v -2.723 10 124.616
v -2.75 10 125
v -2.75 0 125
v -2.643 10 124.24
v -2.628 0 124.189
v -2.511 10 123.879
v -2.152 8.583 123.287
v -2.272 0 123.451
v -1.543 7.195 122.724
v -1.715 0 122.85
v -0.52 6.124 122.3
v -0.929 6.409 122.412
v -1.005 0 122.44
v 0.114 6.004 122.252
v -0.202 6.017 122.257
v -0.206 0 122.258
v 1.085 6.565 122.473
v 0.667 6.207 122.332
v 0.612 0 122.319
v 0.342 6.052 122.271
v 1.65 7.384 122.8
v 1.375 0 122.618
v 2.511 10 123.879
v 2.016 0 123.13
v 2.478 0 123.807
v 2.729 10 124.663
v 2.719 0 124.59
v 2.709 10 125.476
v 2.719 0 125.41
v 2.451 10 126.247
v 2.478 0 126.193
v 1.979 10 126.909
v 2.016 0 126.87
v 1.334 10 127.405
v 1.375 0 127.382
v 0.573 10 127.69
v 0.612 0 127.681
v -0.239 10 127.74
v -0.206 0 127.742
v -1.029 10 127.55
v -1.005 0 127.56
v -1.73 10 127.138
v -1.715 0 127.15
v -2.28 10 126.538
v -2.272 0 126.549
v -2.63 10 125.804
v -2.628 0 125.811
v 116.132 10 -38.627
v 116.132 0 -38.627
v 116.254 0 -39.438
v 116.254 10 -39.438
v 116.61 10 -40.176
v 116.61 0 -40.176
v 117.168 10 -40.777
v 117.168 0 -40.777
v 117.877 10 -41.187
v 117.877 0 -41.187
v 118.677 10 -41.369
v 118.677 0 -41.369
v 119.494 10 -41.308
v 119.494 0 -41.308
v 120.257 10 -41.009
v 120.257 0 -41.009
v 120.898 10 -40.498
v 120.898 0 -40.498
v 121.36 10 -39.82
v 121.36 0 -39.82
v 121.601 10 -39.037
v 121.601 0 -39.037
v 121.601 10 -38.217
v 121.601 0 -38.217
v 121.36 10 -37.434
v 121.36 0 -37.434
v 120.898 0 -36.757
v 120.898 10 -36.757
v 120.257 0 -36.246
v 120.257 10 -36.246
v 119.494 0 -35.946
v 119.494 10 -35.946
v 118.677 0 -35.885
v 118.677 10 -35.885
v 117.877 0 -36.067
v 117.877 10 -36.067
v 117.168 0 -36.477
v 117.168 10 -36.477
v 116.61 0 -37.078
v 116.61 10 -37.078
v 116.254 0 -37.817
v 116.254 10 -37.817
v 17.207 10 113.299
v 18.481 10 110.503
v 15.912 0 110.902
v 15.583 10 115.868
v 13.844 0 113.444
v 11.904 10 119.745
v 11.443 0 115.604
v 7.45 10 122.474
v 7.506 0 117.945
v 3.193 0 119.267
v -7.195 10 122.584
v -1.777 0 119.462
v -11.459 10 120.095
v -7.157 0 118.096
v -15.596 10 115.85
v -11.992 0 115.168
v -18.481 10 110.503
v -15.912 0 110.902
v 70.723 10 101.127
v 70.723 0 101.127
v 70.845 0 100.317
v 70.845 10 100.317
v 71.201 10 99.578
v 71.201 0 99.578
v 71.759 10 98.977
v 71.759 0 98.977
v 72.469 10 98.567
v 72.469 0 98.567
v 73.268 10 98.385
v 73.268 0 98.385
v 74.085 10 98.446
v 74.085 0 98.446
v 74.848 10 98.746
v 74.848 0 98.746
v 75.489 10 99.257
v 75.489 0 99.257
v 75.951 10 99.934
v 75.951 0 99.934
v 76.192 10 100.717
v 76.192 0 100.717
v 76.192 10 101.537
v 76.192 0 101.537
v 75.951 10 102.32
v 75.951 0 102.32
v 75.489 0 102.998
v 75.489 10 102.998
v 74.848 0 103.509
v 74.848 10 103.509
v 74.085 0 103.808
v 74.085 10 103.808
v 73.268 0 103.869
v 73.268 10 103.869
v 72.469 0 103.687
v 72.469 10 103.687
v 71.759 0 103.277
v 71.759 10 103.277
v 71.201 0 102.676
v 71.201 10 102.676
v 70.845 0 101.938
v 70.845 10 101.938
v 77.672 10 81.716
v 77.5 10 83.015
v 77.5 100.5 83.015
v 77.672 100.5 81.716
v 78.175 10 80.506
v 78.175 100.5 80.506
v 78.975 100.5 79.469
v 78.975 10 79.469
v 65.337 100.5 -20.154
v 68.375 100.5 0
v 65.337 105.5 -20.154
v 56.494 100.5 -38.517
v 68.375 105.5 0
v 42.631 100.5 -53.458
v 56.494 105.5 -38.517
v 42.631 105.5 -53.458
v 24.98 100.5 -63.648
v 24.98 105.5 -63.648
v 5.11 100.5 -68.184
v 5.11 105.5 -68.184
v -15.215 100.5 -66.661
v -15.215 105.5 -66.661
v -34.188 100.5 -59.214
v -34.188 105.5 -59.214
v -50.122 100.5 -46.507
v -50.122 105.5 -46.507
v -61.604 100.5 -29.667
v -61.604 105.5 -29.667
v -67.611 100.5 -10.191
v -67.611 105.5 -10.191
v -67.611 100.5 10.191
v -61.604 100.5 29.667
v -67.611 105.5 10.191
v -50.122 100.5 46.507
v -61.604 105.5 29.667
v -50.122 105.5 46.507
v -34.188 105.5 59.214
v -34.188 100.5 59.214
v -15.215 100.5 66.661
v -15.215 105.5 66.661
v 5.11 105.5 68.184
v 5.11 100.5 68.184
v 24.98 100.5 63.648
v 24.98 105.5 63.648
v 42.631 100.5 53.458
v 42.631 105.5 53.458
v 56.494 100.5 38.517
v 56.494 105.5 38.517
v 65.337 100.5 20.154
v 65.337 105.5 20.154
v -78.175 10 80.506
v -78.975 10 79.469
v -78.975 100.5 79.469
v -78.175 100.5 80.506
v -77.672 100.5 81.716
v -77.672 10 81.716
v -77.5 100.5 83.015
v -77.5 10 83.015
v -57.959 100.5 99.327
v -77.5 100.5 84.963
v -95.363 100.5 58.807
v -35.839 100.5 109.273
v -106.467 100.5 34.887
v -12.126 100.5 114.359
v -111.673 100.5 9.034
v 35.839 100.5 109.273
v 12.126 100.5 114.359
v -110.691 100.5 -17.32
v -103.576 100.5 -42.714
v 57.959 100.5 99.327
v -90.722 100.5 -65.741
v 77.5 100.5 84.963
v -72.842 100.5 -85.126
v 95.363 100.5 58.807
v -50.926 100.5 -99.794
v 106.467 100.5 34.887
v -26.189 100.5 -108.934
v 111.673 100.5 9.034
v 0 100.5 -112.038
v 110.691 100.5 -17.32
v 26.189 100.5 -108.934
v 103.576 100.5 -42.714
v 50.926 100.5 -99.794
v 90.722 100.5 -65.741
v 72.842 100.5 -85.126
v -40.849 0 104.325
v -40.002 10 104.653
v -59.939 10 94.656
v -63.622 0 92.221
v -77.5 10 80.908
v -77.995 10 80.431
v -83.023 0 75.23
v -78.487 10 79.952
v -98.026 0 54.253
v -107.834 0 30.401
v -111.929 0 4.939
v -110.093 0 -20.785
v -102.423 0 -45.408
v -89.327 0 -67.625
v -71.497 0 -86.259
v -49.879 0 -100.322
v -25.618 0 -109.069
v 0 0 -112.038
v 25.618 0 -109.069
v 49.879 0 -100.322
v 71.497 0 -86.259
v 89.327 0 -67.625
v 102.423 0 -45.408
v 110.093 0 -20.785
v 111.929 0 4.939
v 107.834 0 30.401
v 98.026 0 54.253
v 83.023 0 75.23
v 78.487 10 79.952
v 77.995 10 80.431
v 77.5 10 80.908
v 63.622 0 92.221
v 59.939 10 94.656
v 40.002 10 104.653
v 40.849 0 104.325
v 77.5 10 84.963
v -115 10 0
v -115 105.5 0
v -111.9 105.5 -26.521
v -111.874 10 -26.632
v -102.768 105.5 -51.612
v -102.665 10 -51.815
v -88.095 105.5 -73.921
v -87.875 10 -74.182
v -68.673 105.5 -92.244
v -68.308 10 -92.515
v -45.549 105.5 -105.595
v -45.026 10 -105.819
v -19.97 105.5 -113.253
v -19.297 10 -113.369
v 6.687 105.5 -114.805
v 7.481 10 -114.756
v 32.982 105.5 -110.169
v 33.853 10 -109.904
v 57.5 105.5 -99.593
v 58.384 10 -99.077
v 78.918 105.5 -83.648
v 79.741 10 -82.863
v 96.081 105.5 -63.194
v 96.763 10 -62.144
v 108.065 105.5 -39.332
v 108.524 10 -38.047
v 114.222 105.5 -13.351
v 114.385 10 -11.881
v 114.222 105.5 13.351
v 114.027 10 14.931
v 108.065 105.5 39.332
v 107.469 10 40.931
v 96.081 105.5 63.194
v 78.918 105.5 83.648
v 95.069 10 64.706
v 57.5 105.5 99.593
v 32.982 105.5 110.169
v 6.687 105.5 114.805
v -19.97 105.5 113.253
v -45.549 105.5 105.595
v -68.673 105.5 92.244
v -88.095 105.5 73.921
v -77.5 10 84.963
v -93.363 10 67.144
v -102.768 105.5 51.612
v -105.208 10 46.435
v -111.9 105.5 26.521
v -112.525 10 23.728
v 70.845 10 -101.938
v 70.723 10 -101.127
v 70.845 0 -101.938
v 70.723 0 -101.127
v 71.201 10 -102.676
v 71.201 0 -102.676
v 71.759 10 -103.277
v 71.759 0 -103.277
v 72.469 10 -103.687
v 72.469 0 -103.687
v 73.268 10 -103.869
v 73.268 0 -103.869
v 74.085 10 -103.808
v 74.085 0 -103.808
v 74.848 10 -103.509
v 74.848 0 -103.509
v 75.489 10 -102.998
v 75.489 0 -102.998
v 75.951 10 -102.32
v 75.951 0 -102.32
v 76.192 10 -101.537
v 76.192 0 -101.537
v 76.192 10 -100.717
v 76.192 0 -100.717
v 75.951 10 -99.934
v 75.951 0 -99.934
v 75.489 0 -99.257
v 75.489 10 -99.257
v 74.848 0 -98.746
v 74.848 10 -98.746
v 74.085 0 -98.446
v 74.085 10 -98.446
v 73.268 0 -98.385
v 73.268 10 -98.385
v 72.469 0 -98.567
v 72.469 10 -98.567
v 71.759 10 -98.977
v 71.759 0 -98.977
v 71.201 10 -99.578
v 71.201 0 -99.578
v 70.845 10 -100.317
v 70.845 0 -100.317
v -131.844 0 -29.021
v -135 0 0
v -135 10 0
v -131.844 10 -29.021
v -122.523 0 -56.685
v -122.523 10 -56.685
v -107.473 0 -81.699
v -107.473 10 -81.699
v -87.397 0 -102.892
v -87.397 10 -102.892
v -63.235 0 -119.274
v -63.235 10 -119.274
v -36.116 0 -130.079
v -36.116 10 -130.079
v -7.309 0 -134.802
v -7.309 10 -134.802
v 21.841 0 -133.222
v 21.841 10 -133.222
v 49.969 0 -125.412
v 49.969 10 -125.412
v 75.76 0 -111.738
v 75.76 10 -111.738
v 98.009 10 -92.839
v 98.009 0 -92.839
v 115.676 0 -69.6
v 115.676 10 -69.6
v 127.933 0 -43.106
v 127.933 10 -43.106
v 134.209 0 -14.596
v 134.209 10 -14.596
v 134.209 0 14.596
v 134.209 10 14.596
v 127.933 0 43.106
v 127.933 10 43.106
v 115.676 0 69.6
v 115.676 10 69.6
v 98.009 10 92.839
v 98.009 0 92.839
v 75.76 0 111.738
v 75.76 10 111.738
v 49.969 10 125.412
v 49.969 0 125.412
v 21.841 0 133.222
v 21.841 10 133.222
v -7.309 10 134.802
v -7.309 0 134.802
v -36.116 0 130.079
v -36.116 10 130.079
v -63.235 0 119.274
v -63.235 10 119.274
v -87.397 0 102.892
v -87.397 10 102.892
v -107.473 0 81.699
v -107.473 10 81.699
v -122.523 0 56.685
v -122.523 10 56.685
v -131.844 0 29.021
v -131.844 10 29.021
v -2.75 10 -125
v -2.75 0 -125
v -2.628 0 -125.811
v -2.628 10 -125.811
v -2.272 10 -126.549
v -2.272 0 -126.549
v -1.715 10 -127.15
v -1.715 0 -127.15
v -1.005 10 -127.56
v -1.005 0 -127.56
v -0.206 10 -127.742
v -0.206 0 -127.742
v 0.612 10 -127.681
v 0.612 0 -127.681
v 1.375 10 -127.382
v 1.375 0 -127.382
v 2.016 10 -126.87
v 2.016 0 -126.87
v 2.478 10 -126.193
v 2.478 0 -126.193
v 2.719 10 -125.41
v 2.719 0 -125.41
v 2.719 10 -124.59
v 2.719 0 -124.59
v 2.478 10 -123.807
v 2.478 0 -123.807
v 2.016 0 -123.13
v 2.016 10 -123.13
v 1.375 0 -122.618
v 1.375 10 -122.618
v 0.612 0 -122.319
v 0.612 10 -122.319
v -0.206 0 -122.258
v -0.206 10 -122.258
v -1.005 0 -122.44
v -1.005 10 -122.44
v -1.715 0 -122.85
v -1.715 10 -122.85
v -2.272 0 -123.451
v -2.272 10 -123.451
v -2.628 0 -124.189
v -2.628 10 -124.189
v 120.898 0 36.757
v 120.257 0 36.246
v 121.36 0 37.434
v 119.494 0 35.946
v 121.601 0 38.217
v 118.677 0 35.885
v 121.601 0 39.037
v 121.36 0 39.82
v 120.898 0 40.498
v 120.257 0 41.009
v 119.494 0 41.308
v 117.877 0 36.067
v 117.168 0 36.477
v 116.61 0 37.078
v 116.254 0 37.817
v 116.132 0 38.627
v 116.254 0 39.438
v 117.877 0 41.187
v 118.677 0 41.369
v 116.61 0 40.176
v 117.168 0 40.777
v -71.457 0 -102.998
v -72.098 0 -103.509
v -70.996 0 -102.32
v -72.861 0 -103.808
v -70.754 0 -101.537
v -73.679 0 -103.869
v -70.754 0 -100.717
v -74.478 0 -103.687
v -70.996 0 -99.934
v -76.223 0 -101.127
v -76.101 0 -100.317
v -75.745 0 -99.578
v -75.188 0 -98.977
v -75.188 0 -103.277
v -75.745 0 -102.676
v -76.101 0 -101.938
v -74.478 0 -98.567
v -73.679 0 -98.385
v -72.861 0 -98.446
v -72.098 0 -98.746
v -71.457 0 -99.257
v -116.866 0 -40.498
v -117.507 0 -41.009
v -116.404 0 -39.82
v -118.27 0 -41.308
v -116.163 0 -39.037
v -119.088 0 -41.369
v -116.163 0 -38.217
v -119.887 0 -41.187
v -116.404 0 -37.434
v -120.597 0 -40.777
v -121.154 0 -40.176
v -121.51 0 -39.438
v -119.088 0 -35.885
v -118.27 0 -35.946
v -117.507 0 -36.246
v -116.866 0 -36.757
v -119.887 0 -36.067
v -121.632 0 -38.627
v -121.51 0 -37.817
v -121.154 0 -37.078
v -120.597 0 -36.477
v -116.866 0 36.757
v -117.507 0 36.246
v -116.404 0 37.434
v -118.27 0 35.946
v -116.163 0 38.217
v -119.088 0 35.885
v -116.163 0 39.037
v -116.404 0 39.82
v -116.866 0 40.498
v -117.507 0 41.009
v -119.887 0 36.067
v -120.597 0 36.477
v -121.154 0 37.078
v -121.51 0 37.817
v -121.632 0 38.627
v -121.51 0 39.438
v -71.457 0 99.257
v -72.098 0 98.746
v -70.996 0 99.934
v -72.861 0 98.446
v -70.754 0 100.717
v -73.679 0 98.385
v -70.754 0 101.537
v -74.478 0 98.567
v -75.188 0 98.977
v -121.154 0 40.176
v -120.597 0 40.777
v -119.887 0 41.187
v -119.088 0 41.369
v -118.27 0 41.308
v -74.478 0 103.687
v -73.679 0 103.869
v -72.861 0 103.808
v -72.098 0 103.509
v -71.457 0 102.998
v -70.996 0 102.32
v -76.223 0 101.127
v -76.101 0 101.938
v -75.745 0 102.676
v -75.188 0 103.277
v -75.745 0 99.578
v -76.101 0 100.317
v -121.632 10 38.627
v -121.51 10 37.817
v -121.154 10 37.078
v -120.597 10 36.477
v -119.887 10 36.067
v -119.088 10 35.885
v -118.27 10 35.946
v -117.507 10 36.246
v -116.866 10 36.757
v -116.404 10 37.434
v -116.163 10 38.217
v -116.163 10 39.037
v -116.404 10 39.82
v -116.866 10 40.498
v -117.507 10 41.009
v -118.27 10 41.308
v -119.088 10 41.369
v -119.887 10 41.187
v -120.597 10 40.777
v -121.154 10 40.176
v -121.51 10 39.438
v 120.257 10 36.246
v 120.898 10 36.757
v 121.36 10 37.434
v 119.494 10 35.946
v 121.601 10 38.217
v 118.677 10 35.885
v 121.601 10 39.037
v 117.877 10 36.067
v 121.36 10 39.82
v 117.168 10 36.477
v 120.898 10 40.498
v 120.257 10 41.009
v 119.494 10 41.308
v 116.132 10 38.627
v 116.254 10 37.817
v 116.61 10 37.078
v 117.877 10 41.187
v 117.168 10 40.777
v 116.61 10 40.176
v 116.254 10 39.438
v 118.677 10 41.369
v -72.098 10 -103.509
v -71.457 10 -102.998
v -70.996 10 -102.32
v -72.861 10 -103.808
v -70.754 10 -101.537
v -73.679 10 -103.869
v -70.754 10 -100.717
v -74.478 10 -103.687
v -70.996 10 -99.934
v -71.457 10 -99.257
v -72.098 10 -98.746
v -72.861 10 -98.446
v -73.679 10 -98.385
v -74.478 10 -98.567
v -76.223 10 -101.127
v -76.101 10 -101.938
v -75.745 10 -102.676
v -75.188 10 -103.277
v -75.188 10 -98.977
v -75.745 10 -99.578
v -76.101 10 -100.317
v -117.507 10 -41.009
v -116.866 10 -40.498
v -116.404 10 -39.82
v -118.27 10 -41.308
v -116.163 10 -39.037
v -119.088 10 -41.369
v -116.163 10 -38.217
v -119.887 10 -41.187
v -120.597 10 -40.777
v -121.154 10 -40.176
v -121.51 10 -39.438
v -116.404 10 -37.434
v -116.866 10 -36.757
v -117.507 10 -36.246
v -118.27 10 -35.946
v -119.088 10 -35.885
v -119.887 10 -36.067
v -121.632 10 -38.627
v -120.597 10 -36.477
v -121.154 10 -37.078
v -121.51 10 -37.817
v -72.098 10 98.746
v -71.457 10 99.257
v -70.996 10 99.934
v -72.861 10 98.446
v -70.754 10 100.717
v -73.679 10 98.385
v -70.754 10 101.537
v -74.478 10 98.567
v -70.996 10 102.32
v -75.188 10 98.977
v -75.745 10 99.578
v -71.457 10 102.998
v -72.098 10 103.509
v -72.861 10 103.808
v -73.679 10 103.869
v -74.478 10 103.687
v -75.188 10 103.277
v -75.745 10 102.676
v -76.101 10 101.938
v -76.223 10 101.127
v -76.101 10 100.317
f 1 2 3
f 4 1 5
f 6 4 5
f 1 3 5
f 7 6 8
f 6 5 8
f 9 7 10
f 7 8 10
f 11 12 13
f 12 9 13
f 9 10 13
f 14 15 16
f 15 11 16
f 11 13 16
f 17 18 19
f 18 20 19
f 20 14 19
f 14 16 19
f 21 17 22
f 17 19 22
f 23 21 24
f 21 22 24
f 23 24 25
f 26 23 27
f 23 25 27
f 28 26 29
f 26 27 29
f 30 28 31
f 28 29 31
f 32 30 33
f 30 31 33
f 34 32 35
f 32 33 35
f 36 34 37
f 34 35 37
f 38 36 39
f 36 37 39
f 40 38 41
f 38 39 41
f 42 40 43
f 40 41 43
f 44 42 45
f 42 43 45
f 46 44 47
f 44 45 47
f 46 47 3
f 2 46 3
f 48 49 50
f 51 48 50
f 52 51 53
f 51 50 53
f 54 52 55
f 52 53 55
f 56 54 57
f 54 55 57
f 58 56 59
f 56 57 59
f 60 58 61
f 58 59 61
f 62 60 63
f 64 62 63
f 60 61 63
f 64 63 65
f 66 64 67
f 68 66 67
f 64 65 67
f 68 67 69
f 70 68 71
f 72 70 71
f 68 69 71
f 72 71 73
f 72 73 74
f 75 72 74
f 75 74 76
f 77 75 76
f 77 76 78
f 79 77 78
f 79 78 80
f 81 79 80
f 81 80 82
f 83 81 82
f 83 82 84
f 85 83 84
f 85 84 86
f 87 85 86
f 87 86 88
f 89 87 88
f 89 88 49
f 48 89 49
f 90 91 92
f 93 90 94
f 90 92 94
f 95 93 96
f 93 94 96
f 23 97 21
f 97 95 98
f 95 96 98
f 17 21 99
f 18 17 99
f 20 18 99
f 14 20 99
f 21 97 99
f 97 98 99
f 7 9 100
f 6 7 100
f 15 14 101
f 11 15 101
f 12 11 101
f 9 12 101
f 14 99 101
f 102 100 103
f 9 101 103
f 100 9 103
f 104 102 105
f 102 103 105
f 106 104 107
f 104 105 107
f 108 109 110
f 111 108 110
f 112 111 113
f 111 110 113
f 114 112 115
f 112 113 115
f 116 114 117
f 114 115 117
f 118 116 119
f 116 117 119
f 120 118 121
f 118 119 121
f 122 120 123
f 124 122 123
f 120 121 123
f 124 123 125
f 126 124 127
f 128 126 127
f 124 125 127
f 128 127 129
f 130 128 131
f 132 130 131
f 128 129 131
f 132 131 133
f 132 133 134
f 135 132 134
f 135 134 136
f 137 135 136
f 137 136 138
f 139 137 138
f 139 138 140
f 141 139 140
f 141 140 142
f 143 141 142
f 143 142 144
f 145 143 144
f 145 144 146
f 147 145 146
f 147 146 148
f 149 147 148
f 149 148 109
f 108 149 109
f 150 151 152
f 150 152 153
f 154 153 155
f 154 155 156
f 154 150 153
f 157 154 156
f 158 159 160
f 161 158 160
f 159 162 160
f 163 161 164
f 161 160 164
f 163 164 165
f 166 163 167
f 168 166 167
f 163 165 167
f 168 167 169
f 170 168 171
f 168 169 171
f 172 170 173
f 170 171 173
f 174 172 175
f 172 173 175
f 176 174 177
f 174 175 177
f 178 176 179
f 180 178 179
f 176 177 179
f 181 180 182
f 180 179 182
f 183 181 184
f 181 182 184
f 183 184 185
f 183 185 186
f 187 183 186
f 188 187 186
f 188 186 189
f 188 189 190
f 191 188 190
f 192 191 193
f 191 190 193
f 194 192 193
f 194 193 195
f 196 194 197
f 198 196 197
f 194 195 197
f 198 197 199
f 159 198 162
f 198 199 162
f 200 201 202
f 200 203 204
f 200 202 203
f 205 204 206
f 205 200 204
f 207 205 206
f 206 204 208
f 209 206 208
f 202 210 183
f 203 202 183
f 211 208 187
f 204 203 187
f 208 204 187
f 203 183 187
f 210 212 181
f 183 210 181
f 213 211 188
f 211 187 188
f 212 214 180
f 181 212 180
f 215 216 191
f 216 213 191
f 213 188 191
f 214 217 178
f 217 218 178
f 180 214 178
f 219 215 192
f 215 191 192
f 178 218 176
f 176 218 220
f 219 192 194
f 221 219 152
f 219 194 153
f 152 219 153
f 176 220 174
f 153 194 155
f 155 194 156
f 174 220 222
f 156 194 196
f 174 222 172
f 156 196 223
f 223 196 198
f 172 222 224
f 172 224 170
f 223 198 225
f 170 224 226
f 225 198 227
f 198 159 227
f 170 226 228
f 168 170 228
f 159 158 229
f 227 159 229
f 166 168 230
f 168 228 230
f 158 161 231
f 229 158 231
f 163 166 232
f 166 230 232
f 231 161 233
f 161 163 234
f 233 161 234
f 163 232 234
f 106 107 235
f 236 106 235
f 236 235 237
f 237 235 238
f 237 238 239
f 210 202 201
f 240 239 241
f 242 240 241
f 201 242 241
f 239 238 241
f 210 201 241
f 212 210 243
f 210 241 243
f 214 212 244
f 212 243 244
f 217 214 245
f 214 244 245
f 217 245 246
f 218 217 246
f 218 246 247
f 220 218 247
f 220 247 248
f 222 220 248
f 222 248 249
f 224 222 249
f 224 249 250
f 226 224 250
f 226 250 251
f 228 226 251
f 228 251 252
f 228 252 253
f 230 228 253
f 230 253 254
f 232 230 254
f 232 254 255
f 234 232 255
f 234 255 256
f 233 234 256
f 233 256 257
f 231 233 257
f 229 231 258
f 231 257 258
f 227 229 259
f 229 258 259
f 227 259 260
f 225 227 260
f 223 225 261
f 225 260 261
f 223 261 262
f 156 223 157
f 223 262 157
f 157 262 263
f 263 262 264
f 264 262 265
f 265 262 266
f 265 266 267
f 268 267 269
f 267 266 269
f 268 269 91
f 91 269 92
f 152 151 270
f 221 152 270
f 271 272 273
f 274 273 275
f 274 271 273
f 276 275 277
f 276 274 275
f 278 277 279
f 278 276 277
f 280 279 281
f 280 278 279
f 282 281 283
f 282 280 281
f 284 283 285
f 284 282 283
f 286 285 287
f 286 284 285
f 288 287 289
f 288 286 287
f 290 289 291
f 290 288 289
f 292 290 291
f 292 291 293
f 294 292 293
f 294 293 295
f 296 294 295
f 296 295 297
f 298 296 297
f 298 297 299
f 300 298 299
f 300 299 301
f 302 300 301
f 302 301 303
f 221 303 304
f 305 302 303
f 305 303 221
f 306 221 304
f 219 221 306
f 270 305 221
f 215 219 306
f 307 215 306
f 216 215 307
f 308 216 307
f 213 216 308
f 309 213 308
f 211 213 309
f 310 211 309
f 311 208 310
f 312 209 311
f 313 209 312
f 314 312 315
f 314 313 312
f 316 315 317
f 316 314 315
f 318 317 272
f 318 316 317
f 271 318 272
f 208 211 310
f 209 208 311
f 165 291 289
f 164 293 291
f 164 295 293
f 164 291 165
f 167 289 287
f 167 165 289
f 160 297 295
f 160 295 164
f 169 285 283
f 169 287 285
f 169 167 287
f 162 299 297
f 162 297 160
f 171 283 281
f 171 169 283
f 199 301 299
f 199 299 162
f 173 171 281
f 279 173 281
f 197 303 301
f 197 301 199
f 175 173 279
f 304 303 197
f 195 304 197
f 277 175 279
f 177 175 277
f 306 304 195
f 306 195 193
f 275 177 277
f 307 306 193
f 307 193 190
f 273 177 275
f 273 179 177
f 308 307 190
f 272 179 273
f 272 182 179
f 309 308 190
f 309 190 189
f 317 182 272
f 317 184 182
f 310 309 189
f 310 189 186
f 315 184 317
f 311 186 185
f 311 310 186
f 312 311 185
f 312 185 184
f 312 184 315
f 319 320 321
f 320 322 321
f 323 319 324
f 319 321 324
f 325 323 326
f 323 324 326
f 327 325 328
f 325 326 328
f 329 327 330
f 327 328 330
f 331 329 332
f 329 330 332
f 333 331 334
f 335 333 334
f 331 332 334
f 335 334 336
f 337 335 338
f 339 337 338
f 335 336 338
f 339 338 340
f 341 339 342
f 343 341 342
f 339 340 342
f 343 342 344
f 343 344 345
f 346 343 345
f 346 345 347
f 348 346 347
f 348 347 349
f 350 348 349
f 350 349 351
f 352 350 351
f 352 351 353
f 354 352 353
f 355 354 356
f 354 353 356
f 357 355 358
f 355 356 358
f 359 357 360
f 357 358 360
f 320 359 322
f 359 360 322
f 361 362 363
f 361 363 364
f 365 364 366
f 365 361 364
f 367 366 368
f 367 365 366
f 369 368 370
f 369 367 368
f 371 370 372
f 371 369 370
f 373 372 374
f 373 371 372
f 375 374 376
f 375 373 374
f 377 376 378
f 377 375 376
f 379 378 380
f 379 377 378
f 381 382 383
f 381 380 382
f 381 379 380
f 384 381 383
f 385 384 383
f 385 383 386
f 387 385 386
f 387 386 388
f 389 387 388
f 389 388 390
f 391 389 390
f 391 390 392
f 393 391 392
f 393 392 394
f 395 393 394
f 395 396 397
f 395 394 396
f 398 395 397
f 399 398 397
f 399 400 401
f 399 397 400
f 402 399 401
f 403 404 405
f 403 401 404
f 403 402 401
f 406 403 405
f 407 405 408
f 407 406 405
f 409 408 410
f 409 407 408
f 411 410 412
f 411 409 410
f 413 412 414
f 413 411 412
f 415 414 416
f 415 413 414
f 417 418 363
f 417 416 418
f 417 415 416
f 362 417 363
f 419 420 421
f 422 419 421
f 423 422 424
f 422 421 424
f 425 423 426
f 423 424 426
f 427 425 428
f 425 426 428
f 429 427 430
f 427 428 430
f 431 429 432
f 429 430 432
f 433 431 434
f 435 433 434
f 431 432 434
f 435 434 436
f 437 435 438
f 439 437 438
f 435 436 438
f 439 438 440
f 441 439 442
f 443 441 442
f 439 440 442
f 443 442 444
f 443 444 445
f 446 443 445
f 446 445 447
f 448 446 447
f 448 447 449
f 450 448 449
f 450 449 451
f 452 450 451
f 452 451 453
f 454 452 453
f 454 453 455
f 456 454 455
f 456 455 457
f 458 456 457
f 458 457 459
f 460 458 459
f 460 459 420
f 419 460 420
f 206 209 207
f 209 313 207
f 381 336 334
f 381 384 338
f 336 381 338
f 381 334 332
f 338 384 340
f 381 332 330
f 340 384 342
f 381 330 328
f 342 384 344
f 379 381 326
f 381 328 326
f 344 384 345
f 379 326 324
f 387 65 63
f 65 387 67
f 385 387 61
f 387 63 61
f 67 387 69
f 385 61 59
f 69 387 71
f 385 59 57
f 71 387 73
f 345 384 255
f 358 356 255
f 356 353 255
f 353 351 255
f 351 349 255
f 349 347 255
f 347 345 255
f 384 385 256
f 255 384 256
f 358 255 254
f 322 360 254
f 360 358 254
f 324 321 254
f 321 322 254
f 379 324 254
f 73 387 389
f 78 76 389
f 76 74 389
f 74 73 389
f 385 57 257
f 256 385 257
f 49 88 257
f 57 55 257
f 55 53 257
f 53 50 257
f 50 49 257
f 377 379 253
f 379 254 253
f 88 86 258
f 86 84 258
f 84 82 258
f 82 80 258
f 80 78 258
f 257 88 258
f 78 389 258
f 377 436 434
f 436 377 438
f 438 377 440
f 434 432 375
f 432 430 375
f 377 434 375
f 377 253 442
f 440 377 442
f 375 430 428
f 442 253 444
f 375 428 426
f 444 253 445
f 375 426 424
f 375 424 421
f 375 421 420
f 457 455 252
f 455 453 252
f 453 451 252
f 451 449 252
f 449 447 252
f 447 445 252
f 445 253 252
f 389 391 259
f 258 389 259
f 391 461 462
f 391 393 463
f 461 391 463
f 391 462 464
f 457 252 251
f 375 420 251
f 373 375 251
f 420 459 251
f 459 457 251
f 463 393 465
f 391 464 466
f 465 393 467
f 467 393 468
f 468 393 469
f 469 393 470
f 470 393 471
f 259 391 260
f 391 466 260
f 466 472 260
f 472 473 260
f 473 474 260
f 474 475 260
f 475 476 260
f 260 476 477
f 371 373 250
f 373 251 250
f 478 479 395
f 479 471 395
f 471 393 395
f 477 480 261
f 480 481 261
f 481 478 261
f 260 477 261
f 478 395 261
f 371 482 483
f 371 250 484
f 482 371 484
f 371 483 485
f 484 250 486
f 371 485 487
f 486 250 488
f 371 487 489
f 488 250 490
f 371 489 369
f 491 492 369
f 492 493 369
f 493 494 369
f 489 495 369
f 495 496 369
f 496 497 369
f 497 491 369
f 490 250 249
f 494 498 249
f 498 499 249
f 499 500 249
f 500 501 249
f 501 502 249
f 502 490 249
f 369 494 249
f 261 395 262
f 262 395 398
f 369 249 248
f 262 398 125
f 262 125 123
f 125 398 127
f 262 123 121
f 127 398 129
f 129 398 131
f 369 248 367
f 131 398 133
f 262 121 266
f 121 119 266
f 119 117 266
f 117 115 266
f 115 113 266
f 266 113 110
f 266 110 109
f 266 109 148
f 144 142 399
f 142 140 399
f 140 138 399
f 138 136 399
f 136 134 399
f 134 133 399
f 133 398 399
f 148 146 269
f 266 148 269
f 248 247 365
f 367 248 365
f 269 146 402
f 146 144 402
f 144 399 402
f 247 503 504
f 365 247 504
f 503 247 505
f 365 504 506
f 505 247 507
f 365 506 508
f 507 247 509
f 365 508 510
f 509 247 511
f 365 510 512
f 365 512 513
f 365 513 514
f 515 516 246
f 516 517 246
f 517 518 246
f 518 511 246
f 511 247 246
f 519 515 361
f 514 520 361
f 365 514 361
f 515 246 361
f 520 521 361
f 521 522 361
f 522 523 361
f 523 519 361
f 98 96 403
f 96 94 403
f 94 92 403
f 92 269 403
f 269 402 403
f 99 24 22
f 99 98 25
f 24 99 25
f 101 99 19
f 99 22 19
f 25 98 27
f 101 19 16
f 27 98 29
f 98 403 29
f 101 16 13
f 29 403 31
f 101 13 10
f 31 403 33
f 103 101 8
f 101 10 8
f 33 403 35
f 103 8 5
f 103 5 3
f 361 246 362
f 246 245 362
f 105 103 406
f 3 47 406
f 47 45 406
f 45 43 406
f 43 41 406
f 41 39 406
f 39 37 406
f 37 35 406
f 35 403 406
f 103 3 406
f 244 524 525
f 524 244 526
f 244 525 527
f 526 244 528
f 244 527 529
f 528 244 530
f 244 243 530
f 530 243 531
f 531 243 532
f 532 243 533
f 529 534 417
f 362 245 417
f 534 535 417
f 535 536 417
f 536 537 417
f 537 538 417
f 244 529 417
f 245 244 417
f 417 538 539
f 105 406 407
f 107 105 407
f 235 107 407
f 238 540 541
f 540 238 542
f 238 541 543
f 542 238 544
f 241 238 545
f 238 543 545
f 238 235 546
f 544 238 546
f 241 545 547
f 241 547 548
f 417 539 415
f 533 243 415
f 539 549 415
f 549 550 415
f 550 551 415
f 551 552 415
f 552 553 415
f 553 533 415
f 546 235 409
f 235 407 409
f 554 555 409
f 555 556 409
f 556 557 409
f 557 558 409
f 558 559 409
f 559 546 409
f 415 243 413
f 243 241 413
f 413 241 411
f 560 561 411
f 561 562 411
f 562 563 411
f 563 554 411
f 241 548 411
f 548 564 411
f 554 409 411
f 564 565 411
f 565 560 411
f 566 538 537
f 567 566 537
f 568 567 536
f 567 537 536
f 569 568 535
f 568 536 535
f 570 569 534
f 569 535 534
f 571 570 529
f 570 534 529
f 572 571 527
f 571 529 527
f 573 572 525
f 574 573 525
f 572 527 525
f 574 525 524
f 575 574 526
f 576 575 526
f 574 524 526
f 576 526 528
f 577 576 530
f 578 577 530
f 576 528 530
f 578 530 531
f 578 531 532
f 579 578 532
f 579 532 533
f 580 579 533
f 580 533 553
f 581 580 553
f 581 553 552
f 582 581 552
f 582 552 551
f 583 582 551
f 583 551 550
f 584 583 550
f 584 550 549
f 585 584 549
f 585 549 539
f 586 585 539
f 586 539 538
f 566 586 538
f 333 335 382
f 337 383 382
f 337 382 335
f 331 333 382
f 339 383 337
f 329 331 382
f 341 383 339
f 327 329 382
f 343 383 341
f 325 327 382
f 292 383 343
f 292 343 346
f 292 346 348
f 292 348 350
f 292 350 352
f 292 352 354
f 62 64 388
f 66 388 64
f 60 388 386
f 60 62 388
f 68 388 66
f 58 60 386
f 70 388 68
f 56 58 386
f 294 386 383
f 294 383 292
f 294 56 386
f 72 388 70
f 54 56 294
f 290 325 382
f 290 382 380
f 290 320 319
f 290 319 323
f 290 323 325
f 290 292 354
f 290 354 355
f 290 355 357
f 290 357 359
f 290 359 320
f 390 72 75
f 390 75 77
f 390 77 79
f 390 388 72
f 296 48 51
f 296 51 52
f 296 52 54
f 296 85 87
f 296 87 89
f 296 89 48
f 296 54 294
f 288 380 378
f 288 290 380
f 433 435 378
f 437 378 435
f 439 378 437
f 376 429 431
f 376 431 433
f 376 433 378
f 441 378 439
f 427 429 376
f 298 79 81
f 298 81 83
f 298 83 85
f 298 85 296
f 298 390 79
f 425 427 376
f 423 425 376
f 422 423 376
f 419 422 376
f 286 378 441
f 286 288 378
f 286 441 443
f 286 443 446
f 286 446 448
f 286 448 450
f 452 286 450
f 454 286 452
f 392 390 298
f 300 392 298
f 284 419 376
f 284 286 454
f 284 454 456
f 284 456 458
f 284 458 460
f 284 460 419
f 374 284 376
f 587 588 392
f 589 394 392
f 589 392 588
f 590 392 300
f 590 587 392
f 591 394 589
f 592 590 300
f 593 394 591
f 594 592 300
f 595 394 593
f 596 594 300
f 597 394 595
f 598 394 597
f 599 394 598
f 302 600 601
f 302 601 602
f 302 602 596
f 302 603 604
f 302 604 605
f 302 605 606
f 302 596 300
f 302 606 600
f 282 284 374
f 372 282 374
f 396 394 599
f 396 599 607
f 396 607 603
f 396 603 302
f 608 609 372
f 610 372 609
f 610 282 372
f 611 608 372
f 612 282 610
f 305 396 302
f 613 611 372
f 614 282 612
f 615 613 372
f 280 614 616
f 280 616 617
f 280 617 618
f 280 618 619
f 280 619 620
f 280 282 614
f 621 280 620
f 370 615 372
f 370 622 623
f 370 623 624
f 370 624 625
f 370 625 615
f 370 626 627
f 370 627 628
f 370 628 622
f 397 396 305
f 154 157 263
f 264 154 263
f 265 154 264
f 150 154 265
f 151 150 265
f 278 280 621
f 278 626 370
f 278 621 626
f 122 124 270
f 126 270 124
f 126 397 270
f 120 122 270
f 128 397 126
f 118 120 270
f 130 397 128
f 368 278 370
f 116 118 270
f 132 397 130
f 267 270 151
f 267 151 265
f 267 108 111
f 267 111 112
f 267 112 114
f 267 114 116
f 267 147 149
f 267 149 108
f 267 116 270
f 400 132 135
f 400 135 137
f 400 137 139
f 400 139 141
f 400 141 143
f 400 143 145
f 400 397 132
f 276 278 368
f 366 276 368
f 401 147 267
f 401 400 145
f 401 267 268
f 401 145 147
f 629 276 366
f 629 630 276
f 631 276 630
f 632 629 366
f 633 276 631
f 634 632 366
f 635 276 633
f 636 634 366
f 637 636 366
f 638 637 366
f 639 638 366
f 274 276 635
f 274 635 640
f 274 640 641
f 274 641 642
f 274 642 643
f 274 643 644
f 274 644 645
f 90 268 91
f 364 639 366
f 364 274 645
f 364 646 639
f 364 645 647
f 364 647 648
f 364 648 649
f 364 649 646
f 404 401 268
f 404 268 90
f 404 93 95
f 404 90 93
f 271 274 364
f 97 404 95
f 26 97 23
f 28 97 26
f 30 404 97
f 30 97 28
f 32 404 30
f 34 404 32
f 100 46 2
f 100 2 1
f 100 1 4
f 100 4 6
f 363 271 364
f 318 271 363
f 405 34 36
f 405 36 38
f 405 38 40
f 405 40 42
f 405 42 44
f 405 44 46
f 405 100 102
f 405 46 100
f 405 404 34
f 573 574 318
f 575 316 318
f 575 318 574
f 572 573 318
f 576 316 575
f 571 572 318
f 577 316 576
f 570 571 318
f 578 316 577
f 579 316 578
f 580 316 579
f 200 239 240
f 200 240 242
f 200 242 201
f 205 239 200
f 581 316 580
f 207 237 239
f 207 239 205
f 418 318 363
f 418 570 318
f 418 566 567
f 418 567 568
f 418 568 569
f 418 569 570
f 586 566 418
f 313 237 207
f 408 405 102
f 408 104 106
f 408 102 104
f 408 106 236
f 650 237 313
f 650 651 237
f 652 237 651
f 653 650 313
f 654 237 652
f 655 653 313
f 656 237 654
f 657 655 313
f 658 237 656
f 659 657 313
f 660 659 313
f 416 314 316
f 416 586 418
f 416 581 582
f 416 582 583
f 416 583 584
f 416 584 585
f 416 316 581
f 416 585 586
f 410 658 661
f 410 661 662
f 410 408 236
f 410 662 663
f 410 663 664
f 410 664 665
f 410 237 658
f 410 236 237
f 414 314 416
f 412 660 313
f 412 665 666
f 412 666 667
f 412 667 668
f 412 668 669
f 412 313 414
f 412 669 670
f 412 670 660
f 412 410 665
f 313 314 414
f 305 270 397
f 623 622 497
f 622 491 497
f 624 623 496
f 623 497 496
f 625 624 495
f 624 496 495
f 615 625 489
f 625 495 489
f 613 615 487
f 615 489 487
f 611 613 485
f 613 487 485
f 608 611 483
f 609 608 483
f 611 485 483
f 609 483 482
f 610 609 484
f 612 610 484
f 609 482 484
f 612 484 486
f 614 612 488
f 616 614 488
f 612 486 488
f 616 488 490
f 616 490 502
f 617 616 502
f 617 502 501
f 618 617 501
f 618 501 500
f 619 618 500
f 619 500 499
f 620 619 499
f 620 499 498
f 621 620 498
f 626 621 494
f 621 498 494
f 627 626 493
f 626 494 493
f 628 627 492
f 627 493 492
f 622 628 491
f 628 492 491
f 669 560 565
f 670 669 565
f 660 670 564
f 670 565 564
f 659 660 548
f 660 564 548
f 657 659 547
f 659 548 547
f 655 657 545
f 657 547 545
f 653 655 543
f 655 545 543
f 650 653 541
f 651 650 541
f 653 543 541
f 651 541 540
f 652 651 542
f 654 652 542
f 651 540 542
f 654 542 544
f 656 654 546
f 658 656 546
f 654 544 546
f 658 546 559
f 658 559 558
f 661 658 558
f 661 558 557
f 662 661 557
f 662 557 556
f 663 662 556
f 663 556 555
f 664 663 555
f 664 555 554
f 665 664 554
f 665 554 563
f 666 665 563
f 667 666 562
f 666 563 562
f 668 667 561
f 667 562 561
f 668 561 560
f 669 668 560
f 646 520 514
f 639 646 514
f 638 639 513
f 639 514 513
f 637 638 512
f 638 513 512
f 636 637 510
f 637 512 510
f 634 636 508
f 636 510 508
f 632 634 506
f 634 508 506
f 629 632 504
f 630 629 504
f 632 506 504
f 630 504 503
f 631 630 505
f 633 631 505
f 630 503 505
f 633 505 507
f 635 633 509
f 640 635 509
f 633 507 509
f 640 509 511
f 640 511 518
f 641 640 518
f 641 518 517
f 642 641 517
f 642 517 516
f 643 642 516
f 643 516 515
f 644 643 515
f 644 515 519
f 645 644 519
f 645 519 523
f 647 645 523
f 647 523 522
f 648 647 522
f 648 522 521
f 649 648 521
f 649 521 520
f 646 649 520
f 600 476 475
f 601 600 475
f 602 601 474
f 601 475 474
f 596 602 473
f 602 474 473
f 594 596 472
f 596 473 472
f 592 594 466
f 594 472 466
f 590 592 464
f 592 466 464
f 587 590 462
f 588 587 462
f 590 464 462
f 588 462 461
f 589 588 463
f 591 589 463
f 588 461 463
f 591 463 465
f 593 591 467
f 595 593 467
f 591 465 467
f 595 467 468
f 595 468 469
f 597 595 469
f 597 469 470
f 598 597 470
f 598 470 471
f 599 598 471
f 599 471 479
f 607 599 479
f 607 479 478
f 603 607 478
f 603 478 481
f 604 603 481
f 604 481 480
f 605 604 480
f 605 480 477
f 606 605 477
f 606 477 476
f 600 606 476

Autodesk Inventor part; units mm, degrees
sketch "Sketch1" plane through (0, 0, 0) normal (0, 1, 0) x (-1, 0, 0)
  circle A0 centre (0, 0) radius 135
  circle A1 centre (0, 0) radius 115
  circle A2 centre (0, 0) radius 112.0375
  circle A3 centre (0, 0) radius 9.5
  circle A4 centre (0, 0) radius 125
  circle A5 centre (0, -125) radius 2.75
  circle A6 centre (73.4732, -101.1271) radius 2.75
  circle A7 centre (118.8821, -38.6271) radius 2.75
  circle A8 centre (118.8821, 38.6271) radius 2.75
  circle A9 centre (73.4732, 101.1271) radius 2.75
  circle A10 centre (0, 125) radius 2.75
  circle A11 centre (-73.4732, 101.1271) radius 2.75
  circle A12 centre (-118.8821, 38.6271) radius 2.75
  circle A13 centre (-118.8821, -38.6271) radius 2.75
  circle A14 centre (-73.4732, -101.1271) radius 2.75
  dimension "d264" = 250
  dimension "Absolute_Diameter" = 270
  dimension "Diameter_No_Outer_Lip" = 230
  dimension "Inner_Cylinder_Diameter" = 224.075
  dimension "Lip_Diameter" = 19
  dimension "d265" = 5.5
  dimension "d268" = 360
extrude "Extrusion1" add sketch "Sketch1" along normal blind 10 contours A0 | A4 A7 A6 A5 A14 A13 A12 A11 A10 A9 A8
extrude "Extrusion2" add sketch "Sketch1" along normal blind 105.5 contours A1
sketch "Sketch2" plane through (0, 105.5, 0) normal (0, 1, 0) x (1, 0, 0)
  circle A0 centre (0, 0) radius 115
  circle A1 centre (0, 0) radius 68.375
  dimension "Lip_Diameter_Out" = 230
  dimension "Inner_Lip_Diameter" = 136.75
extrude "Extrusion7" add sketch "Sketch2" against normal blind 5
sketch "Sketch28" plane through (0, 10, 0) normal (0, 1, 0) x (1, 0, 0)
  line L0 (-77.5, -75) -> (77.5, -75)
  line L1 (77.5, -75) -> (77.5, -175)
  line L2 (77.5, -175) -> (-77.5, -175)
  line L3 (-77.5, -175) -> (-77.5, -75)
  circle A0 centre (0, -125) radius 2.75 projected
  line L4 (-77.5, -75) -> (77.5, -175) construction
  line L5 (77.5, -75) -> (-77.5, -175) construction
  point P0 (0, 0)
  dimension "d271" = 155
  dimension "d272" = 100
extrude "Extrusion34" cut sketch "Sketch28" along normal up to surface (90.5 mm away)
sketch "Sketch30" plane through (0, 10, 0) normal (0, 1, 0) x (1, 0, 0)
  point P0 (0, 0)
ref_plane "Work Plane19" through (16.25, 10, -160.125) normal (0, 0.3947, -0.9188) x (1, 0, 0)
ref_plane "Work Plane21" through (16.25, 10, -160.125) normal (0, 0.9118, 0.4107) x (1, 0, 0)
ref_plane "Work Plane22" through (16.25, 101.1762, -119.0531) normal (0, 0.9118, 0.4107) x (1, 0, 0)
sketch "Sketch31" plane through (16.25, 101.1762, -119.0531) normal (0, 0.9118, 0.4107) x (1, 0, 0)
  circle A0 centre (-16.25, -239.1031) radius 20
  point P0 (-16.25, -150.1031)
  dimension "d286" = 40
  dimension "d289" = 89
extrude "Extrusion36" cut sketch "Sketch31" along normal mid plane 52.8625
fillet "Fillet19" radius 5 2 edges at (-77.5, 55.25, 80.9083) (77.5, 55.25, 80.9083)
properties part number "Cylinder Segment  Camera only"
